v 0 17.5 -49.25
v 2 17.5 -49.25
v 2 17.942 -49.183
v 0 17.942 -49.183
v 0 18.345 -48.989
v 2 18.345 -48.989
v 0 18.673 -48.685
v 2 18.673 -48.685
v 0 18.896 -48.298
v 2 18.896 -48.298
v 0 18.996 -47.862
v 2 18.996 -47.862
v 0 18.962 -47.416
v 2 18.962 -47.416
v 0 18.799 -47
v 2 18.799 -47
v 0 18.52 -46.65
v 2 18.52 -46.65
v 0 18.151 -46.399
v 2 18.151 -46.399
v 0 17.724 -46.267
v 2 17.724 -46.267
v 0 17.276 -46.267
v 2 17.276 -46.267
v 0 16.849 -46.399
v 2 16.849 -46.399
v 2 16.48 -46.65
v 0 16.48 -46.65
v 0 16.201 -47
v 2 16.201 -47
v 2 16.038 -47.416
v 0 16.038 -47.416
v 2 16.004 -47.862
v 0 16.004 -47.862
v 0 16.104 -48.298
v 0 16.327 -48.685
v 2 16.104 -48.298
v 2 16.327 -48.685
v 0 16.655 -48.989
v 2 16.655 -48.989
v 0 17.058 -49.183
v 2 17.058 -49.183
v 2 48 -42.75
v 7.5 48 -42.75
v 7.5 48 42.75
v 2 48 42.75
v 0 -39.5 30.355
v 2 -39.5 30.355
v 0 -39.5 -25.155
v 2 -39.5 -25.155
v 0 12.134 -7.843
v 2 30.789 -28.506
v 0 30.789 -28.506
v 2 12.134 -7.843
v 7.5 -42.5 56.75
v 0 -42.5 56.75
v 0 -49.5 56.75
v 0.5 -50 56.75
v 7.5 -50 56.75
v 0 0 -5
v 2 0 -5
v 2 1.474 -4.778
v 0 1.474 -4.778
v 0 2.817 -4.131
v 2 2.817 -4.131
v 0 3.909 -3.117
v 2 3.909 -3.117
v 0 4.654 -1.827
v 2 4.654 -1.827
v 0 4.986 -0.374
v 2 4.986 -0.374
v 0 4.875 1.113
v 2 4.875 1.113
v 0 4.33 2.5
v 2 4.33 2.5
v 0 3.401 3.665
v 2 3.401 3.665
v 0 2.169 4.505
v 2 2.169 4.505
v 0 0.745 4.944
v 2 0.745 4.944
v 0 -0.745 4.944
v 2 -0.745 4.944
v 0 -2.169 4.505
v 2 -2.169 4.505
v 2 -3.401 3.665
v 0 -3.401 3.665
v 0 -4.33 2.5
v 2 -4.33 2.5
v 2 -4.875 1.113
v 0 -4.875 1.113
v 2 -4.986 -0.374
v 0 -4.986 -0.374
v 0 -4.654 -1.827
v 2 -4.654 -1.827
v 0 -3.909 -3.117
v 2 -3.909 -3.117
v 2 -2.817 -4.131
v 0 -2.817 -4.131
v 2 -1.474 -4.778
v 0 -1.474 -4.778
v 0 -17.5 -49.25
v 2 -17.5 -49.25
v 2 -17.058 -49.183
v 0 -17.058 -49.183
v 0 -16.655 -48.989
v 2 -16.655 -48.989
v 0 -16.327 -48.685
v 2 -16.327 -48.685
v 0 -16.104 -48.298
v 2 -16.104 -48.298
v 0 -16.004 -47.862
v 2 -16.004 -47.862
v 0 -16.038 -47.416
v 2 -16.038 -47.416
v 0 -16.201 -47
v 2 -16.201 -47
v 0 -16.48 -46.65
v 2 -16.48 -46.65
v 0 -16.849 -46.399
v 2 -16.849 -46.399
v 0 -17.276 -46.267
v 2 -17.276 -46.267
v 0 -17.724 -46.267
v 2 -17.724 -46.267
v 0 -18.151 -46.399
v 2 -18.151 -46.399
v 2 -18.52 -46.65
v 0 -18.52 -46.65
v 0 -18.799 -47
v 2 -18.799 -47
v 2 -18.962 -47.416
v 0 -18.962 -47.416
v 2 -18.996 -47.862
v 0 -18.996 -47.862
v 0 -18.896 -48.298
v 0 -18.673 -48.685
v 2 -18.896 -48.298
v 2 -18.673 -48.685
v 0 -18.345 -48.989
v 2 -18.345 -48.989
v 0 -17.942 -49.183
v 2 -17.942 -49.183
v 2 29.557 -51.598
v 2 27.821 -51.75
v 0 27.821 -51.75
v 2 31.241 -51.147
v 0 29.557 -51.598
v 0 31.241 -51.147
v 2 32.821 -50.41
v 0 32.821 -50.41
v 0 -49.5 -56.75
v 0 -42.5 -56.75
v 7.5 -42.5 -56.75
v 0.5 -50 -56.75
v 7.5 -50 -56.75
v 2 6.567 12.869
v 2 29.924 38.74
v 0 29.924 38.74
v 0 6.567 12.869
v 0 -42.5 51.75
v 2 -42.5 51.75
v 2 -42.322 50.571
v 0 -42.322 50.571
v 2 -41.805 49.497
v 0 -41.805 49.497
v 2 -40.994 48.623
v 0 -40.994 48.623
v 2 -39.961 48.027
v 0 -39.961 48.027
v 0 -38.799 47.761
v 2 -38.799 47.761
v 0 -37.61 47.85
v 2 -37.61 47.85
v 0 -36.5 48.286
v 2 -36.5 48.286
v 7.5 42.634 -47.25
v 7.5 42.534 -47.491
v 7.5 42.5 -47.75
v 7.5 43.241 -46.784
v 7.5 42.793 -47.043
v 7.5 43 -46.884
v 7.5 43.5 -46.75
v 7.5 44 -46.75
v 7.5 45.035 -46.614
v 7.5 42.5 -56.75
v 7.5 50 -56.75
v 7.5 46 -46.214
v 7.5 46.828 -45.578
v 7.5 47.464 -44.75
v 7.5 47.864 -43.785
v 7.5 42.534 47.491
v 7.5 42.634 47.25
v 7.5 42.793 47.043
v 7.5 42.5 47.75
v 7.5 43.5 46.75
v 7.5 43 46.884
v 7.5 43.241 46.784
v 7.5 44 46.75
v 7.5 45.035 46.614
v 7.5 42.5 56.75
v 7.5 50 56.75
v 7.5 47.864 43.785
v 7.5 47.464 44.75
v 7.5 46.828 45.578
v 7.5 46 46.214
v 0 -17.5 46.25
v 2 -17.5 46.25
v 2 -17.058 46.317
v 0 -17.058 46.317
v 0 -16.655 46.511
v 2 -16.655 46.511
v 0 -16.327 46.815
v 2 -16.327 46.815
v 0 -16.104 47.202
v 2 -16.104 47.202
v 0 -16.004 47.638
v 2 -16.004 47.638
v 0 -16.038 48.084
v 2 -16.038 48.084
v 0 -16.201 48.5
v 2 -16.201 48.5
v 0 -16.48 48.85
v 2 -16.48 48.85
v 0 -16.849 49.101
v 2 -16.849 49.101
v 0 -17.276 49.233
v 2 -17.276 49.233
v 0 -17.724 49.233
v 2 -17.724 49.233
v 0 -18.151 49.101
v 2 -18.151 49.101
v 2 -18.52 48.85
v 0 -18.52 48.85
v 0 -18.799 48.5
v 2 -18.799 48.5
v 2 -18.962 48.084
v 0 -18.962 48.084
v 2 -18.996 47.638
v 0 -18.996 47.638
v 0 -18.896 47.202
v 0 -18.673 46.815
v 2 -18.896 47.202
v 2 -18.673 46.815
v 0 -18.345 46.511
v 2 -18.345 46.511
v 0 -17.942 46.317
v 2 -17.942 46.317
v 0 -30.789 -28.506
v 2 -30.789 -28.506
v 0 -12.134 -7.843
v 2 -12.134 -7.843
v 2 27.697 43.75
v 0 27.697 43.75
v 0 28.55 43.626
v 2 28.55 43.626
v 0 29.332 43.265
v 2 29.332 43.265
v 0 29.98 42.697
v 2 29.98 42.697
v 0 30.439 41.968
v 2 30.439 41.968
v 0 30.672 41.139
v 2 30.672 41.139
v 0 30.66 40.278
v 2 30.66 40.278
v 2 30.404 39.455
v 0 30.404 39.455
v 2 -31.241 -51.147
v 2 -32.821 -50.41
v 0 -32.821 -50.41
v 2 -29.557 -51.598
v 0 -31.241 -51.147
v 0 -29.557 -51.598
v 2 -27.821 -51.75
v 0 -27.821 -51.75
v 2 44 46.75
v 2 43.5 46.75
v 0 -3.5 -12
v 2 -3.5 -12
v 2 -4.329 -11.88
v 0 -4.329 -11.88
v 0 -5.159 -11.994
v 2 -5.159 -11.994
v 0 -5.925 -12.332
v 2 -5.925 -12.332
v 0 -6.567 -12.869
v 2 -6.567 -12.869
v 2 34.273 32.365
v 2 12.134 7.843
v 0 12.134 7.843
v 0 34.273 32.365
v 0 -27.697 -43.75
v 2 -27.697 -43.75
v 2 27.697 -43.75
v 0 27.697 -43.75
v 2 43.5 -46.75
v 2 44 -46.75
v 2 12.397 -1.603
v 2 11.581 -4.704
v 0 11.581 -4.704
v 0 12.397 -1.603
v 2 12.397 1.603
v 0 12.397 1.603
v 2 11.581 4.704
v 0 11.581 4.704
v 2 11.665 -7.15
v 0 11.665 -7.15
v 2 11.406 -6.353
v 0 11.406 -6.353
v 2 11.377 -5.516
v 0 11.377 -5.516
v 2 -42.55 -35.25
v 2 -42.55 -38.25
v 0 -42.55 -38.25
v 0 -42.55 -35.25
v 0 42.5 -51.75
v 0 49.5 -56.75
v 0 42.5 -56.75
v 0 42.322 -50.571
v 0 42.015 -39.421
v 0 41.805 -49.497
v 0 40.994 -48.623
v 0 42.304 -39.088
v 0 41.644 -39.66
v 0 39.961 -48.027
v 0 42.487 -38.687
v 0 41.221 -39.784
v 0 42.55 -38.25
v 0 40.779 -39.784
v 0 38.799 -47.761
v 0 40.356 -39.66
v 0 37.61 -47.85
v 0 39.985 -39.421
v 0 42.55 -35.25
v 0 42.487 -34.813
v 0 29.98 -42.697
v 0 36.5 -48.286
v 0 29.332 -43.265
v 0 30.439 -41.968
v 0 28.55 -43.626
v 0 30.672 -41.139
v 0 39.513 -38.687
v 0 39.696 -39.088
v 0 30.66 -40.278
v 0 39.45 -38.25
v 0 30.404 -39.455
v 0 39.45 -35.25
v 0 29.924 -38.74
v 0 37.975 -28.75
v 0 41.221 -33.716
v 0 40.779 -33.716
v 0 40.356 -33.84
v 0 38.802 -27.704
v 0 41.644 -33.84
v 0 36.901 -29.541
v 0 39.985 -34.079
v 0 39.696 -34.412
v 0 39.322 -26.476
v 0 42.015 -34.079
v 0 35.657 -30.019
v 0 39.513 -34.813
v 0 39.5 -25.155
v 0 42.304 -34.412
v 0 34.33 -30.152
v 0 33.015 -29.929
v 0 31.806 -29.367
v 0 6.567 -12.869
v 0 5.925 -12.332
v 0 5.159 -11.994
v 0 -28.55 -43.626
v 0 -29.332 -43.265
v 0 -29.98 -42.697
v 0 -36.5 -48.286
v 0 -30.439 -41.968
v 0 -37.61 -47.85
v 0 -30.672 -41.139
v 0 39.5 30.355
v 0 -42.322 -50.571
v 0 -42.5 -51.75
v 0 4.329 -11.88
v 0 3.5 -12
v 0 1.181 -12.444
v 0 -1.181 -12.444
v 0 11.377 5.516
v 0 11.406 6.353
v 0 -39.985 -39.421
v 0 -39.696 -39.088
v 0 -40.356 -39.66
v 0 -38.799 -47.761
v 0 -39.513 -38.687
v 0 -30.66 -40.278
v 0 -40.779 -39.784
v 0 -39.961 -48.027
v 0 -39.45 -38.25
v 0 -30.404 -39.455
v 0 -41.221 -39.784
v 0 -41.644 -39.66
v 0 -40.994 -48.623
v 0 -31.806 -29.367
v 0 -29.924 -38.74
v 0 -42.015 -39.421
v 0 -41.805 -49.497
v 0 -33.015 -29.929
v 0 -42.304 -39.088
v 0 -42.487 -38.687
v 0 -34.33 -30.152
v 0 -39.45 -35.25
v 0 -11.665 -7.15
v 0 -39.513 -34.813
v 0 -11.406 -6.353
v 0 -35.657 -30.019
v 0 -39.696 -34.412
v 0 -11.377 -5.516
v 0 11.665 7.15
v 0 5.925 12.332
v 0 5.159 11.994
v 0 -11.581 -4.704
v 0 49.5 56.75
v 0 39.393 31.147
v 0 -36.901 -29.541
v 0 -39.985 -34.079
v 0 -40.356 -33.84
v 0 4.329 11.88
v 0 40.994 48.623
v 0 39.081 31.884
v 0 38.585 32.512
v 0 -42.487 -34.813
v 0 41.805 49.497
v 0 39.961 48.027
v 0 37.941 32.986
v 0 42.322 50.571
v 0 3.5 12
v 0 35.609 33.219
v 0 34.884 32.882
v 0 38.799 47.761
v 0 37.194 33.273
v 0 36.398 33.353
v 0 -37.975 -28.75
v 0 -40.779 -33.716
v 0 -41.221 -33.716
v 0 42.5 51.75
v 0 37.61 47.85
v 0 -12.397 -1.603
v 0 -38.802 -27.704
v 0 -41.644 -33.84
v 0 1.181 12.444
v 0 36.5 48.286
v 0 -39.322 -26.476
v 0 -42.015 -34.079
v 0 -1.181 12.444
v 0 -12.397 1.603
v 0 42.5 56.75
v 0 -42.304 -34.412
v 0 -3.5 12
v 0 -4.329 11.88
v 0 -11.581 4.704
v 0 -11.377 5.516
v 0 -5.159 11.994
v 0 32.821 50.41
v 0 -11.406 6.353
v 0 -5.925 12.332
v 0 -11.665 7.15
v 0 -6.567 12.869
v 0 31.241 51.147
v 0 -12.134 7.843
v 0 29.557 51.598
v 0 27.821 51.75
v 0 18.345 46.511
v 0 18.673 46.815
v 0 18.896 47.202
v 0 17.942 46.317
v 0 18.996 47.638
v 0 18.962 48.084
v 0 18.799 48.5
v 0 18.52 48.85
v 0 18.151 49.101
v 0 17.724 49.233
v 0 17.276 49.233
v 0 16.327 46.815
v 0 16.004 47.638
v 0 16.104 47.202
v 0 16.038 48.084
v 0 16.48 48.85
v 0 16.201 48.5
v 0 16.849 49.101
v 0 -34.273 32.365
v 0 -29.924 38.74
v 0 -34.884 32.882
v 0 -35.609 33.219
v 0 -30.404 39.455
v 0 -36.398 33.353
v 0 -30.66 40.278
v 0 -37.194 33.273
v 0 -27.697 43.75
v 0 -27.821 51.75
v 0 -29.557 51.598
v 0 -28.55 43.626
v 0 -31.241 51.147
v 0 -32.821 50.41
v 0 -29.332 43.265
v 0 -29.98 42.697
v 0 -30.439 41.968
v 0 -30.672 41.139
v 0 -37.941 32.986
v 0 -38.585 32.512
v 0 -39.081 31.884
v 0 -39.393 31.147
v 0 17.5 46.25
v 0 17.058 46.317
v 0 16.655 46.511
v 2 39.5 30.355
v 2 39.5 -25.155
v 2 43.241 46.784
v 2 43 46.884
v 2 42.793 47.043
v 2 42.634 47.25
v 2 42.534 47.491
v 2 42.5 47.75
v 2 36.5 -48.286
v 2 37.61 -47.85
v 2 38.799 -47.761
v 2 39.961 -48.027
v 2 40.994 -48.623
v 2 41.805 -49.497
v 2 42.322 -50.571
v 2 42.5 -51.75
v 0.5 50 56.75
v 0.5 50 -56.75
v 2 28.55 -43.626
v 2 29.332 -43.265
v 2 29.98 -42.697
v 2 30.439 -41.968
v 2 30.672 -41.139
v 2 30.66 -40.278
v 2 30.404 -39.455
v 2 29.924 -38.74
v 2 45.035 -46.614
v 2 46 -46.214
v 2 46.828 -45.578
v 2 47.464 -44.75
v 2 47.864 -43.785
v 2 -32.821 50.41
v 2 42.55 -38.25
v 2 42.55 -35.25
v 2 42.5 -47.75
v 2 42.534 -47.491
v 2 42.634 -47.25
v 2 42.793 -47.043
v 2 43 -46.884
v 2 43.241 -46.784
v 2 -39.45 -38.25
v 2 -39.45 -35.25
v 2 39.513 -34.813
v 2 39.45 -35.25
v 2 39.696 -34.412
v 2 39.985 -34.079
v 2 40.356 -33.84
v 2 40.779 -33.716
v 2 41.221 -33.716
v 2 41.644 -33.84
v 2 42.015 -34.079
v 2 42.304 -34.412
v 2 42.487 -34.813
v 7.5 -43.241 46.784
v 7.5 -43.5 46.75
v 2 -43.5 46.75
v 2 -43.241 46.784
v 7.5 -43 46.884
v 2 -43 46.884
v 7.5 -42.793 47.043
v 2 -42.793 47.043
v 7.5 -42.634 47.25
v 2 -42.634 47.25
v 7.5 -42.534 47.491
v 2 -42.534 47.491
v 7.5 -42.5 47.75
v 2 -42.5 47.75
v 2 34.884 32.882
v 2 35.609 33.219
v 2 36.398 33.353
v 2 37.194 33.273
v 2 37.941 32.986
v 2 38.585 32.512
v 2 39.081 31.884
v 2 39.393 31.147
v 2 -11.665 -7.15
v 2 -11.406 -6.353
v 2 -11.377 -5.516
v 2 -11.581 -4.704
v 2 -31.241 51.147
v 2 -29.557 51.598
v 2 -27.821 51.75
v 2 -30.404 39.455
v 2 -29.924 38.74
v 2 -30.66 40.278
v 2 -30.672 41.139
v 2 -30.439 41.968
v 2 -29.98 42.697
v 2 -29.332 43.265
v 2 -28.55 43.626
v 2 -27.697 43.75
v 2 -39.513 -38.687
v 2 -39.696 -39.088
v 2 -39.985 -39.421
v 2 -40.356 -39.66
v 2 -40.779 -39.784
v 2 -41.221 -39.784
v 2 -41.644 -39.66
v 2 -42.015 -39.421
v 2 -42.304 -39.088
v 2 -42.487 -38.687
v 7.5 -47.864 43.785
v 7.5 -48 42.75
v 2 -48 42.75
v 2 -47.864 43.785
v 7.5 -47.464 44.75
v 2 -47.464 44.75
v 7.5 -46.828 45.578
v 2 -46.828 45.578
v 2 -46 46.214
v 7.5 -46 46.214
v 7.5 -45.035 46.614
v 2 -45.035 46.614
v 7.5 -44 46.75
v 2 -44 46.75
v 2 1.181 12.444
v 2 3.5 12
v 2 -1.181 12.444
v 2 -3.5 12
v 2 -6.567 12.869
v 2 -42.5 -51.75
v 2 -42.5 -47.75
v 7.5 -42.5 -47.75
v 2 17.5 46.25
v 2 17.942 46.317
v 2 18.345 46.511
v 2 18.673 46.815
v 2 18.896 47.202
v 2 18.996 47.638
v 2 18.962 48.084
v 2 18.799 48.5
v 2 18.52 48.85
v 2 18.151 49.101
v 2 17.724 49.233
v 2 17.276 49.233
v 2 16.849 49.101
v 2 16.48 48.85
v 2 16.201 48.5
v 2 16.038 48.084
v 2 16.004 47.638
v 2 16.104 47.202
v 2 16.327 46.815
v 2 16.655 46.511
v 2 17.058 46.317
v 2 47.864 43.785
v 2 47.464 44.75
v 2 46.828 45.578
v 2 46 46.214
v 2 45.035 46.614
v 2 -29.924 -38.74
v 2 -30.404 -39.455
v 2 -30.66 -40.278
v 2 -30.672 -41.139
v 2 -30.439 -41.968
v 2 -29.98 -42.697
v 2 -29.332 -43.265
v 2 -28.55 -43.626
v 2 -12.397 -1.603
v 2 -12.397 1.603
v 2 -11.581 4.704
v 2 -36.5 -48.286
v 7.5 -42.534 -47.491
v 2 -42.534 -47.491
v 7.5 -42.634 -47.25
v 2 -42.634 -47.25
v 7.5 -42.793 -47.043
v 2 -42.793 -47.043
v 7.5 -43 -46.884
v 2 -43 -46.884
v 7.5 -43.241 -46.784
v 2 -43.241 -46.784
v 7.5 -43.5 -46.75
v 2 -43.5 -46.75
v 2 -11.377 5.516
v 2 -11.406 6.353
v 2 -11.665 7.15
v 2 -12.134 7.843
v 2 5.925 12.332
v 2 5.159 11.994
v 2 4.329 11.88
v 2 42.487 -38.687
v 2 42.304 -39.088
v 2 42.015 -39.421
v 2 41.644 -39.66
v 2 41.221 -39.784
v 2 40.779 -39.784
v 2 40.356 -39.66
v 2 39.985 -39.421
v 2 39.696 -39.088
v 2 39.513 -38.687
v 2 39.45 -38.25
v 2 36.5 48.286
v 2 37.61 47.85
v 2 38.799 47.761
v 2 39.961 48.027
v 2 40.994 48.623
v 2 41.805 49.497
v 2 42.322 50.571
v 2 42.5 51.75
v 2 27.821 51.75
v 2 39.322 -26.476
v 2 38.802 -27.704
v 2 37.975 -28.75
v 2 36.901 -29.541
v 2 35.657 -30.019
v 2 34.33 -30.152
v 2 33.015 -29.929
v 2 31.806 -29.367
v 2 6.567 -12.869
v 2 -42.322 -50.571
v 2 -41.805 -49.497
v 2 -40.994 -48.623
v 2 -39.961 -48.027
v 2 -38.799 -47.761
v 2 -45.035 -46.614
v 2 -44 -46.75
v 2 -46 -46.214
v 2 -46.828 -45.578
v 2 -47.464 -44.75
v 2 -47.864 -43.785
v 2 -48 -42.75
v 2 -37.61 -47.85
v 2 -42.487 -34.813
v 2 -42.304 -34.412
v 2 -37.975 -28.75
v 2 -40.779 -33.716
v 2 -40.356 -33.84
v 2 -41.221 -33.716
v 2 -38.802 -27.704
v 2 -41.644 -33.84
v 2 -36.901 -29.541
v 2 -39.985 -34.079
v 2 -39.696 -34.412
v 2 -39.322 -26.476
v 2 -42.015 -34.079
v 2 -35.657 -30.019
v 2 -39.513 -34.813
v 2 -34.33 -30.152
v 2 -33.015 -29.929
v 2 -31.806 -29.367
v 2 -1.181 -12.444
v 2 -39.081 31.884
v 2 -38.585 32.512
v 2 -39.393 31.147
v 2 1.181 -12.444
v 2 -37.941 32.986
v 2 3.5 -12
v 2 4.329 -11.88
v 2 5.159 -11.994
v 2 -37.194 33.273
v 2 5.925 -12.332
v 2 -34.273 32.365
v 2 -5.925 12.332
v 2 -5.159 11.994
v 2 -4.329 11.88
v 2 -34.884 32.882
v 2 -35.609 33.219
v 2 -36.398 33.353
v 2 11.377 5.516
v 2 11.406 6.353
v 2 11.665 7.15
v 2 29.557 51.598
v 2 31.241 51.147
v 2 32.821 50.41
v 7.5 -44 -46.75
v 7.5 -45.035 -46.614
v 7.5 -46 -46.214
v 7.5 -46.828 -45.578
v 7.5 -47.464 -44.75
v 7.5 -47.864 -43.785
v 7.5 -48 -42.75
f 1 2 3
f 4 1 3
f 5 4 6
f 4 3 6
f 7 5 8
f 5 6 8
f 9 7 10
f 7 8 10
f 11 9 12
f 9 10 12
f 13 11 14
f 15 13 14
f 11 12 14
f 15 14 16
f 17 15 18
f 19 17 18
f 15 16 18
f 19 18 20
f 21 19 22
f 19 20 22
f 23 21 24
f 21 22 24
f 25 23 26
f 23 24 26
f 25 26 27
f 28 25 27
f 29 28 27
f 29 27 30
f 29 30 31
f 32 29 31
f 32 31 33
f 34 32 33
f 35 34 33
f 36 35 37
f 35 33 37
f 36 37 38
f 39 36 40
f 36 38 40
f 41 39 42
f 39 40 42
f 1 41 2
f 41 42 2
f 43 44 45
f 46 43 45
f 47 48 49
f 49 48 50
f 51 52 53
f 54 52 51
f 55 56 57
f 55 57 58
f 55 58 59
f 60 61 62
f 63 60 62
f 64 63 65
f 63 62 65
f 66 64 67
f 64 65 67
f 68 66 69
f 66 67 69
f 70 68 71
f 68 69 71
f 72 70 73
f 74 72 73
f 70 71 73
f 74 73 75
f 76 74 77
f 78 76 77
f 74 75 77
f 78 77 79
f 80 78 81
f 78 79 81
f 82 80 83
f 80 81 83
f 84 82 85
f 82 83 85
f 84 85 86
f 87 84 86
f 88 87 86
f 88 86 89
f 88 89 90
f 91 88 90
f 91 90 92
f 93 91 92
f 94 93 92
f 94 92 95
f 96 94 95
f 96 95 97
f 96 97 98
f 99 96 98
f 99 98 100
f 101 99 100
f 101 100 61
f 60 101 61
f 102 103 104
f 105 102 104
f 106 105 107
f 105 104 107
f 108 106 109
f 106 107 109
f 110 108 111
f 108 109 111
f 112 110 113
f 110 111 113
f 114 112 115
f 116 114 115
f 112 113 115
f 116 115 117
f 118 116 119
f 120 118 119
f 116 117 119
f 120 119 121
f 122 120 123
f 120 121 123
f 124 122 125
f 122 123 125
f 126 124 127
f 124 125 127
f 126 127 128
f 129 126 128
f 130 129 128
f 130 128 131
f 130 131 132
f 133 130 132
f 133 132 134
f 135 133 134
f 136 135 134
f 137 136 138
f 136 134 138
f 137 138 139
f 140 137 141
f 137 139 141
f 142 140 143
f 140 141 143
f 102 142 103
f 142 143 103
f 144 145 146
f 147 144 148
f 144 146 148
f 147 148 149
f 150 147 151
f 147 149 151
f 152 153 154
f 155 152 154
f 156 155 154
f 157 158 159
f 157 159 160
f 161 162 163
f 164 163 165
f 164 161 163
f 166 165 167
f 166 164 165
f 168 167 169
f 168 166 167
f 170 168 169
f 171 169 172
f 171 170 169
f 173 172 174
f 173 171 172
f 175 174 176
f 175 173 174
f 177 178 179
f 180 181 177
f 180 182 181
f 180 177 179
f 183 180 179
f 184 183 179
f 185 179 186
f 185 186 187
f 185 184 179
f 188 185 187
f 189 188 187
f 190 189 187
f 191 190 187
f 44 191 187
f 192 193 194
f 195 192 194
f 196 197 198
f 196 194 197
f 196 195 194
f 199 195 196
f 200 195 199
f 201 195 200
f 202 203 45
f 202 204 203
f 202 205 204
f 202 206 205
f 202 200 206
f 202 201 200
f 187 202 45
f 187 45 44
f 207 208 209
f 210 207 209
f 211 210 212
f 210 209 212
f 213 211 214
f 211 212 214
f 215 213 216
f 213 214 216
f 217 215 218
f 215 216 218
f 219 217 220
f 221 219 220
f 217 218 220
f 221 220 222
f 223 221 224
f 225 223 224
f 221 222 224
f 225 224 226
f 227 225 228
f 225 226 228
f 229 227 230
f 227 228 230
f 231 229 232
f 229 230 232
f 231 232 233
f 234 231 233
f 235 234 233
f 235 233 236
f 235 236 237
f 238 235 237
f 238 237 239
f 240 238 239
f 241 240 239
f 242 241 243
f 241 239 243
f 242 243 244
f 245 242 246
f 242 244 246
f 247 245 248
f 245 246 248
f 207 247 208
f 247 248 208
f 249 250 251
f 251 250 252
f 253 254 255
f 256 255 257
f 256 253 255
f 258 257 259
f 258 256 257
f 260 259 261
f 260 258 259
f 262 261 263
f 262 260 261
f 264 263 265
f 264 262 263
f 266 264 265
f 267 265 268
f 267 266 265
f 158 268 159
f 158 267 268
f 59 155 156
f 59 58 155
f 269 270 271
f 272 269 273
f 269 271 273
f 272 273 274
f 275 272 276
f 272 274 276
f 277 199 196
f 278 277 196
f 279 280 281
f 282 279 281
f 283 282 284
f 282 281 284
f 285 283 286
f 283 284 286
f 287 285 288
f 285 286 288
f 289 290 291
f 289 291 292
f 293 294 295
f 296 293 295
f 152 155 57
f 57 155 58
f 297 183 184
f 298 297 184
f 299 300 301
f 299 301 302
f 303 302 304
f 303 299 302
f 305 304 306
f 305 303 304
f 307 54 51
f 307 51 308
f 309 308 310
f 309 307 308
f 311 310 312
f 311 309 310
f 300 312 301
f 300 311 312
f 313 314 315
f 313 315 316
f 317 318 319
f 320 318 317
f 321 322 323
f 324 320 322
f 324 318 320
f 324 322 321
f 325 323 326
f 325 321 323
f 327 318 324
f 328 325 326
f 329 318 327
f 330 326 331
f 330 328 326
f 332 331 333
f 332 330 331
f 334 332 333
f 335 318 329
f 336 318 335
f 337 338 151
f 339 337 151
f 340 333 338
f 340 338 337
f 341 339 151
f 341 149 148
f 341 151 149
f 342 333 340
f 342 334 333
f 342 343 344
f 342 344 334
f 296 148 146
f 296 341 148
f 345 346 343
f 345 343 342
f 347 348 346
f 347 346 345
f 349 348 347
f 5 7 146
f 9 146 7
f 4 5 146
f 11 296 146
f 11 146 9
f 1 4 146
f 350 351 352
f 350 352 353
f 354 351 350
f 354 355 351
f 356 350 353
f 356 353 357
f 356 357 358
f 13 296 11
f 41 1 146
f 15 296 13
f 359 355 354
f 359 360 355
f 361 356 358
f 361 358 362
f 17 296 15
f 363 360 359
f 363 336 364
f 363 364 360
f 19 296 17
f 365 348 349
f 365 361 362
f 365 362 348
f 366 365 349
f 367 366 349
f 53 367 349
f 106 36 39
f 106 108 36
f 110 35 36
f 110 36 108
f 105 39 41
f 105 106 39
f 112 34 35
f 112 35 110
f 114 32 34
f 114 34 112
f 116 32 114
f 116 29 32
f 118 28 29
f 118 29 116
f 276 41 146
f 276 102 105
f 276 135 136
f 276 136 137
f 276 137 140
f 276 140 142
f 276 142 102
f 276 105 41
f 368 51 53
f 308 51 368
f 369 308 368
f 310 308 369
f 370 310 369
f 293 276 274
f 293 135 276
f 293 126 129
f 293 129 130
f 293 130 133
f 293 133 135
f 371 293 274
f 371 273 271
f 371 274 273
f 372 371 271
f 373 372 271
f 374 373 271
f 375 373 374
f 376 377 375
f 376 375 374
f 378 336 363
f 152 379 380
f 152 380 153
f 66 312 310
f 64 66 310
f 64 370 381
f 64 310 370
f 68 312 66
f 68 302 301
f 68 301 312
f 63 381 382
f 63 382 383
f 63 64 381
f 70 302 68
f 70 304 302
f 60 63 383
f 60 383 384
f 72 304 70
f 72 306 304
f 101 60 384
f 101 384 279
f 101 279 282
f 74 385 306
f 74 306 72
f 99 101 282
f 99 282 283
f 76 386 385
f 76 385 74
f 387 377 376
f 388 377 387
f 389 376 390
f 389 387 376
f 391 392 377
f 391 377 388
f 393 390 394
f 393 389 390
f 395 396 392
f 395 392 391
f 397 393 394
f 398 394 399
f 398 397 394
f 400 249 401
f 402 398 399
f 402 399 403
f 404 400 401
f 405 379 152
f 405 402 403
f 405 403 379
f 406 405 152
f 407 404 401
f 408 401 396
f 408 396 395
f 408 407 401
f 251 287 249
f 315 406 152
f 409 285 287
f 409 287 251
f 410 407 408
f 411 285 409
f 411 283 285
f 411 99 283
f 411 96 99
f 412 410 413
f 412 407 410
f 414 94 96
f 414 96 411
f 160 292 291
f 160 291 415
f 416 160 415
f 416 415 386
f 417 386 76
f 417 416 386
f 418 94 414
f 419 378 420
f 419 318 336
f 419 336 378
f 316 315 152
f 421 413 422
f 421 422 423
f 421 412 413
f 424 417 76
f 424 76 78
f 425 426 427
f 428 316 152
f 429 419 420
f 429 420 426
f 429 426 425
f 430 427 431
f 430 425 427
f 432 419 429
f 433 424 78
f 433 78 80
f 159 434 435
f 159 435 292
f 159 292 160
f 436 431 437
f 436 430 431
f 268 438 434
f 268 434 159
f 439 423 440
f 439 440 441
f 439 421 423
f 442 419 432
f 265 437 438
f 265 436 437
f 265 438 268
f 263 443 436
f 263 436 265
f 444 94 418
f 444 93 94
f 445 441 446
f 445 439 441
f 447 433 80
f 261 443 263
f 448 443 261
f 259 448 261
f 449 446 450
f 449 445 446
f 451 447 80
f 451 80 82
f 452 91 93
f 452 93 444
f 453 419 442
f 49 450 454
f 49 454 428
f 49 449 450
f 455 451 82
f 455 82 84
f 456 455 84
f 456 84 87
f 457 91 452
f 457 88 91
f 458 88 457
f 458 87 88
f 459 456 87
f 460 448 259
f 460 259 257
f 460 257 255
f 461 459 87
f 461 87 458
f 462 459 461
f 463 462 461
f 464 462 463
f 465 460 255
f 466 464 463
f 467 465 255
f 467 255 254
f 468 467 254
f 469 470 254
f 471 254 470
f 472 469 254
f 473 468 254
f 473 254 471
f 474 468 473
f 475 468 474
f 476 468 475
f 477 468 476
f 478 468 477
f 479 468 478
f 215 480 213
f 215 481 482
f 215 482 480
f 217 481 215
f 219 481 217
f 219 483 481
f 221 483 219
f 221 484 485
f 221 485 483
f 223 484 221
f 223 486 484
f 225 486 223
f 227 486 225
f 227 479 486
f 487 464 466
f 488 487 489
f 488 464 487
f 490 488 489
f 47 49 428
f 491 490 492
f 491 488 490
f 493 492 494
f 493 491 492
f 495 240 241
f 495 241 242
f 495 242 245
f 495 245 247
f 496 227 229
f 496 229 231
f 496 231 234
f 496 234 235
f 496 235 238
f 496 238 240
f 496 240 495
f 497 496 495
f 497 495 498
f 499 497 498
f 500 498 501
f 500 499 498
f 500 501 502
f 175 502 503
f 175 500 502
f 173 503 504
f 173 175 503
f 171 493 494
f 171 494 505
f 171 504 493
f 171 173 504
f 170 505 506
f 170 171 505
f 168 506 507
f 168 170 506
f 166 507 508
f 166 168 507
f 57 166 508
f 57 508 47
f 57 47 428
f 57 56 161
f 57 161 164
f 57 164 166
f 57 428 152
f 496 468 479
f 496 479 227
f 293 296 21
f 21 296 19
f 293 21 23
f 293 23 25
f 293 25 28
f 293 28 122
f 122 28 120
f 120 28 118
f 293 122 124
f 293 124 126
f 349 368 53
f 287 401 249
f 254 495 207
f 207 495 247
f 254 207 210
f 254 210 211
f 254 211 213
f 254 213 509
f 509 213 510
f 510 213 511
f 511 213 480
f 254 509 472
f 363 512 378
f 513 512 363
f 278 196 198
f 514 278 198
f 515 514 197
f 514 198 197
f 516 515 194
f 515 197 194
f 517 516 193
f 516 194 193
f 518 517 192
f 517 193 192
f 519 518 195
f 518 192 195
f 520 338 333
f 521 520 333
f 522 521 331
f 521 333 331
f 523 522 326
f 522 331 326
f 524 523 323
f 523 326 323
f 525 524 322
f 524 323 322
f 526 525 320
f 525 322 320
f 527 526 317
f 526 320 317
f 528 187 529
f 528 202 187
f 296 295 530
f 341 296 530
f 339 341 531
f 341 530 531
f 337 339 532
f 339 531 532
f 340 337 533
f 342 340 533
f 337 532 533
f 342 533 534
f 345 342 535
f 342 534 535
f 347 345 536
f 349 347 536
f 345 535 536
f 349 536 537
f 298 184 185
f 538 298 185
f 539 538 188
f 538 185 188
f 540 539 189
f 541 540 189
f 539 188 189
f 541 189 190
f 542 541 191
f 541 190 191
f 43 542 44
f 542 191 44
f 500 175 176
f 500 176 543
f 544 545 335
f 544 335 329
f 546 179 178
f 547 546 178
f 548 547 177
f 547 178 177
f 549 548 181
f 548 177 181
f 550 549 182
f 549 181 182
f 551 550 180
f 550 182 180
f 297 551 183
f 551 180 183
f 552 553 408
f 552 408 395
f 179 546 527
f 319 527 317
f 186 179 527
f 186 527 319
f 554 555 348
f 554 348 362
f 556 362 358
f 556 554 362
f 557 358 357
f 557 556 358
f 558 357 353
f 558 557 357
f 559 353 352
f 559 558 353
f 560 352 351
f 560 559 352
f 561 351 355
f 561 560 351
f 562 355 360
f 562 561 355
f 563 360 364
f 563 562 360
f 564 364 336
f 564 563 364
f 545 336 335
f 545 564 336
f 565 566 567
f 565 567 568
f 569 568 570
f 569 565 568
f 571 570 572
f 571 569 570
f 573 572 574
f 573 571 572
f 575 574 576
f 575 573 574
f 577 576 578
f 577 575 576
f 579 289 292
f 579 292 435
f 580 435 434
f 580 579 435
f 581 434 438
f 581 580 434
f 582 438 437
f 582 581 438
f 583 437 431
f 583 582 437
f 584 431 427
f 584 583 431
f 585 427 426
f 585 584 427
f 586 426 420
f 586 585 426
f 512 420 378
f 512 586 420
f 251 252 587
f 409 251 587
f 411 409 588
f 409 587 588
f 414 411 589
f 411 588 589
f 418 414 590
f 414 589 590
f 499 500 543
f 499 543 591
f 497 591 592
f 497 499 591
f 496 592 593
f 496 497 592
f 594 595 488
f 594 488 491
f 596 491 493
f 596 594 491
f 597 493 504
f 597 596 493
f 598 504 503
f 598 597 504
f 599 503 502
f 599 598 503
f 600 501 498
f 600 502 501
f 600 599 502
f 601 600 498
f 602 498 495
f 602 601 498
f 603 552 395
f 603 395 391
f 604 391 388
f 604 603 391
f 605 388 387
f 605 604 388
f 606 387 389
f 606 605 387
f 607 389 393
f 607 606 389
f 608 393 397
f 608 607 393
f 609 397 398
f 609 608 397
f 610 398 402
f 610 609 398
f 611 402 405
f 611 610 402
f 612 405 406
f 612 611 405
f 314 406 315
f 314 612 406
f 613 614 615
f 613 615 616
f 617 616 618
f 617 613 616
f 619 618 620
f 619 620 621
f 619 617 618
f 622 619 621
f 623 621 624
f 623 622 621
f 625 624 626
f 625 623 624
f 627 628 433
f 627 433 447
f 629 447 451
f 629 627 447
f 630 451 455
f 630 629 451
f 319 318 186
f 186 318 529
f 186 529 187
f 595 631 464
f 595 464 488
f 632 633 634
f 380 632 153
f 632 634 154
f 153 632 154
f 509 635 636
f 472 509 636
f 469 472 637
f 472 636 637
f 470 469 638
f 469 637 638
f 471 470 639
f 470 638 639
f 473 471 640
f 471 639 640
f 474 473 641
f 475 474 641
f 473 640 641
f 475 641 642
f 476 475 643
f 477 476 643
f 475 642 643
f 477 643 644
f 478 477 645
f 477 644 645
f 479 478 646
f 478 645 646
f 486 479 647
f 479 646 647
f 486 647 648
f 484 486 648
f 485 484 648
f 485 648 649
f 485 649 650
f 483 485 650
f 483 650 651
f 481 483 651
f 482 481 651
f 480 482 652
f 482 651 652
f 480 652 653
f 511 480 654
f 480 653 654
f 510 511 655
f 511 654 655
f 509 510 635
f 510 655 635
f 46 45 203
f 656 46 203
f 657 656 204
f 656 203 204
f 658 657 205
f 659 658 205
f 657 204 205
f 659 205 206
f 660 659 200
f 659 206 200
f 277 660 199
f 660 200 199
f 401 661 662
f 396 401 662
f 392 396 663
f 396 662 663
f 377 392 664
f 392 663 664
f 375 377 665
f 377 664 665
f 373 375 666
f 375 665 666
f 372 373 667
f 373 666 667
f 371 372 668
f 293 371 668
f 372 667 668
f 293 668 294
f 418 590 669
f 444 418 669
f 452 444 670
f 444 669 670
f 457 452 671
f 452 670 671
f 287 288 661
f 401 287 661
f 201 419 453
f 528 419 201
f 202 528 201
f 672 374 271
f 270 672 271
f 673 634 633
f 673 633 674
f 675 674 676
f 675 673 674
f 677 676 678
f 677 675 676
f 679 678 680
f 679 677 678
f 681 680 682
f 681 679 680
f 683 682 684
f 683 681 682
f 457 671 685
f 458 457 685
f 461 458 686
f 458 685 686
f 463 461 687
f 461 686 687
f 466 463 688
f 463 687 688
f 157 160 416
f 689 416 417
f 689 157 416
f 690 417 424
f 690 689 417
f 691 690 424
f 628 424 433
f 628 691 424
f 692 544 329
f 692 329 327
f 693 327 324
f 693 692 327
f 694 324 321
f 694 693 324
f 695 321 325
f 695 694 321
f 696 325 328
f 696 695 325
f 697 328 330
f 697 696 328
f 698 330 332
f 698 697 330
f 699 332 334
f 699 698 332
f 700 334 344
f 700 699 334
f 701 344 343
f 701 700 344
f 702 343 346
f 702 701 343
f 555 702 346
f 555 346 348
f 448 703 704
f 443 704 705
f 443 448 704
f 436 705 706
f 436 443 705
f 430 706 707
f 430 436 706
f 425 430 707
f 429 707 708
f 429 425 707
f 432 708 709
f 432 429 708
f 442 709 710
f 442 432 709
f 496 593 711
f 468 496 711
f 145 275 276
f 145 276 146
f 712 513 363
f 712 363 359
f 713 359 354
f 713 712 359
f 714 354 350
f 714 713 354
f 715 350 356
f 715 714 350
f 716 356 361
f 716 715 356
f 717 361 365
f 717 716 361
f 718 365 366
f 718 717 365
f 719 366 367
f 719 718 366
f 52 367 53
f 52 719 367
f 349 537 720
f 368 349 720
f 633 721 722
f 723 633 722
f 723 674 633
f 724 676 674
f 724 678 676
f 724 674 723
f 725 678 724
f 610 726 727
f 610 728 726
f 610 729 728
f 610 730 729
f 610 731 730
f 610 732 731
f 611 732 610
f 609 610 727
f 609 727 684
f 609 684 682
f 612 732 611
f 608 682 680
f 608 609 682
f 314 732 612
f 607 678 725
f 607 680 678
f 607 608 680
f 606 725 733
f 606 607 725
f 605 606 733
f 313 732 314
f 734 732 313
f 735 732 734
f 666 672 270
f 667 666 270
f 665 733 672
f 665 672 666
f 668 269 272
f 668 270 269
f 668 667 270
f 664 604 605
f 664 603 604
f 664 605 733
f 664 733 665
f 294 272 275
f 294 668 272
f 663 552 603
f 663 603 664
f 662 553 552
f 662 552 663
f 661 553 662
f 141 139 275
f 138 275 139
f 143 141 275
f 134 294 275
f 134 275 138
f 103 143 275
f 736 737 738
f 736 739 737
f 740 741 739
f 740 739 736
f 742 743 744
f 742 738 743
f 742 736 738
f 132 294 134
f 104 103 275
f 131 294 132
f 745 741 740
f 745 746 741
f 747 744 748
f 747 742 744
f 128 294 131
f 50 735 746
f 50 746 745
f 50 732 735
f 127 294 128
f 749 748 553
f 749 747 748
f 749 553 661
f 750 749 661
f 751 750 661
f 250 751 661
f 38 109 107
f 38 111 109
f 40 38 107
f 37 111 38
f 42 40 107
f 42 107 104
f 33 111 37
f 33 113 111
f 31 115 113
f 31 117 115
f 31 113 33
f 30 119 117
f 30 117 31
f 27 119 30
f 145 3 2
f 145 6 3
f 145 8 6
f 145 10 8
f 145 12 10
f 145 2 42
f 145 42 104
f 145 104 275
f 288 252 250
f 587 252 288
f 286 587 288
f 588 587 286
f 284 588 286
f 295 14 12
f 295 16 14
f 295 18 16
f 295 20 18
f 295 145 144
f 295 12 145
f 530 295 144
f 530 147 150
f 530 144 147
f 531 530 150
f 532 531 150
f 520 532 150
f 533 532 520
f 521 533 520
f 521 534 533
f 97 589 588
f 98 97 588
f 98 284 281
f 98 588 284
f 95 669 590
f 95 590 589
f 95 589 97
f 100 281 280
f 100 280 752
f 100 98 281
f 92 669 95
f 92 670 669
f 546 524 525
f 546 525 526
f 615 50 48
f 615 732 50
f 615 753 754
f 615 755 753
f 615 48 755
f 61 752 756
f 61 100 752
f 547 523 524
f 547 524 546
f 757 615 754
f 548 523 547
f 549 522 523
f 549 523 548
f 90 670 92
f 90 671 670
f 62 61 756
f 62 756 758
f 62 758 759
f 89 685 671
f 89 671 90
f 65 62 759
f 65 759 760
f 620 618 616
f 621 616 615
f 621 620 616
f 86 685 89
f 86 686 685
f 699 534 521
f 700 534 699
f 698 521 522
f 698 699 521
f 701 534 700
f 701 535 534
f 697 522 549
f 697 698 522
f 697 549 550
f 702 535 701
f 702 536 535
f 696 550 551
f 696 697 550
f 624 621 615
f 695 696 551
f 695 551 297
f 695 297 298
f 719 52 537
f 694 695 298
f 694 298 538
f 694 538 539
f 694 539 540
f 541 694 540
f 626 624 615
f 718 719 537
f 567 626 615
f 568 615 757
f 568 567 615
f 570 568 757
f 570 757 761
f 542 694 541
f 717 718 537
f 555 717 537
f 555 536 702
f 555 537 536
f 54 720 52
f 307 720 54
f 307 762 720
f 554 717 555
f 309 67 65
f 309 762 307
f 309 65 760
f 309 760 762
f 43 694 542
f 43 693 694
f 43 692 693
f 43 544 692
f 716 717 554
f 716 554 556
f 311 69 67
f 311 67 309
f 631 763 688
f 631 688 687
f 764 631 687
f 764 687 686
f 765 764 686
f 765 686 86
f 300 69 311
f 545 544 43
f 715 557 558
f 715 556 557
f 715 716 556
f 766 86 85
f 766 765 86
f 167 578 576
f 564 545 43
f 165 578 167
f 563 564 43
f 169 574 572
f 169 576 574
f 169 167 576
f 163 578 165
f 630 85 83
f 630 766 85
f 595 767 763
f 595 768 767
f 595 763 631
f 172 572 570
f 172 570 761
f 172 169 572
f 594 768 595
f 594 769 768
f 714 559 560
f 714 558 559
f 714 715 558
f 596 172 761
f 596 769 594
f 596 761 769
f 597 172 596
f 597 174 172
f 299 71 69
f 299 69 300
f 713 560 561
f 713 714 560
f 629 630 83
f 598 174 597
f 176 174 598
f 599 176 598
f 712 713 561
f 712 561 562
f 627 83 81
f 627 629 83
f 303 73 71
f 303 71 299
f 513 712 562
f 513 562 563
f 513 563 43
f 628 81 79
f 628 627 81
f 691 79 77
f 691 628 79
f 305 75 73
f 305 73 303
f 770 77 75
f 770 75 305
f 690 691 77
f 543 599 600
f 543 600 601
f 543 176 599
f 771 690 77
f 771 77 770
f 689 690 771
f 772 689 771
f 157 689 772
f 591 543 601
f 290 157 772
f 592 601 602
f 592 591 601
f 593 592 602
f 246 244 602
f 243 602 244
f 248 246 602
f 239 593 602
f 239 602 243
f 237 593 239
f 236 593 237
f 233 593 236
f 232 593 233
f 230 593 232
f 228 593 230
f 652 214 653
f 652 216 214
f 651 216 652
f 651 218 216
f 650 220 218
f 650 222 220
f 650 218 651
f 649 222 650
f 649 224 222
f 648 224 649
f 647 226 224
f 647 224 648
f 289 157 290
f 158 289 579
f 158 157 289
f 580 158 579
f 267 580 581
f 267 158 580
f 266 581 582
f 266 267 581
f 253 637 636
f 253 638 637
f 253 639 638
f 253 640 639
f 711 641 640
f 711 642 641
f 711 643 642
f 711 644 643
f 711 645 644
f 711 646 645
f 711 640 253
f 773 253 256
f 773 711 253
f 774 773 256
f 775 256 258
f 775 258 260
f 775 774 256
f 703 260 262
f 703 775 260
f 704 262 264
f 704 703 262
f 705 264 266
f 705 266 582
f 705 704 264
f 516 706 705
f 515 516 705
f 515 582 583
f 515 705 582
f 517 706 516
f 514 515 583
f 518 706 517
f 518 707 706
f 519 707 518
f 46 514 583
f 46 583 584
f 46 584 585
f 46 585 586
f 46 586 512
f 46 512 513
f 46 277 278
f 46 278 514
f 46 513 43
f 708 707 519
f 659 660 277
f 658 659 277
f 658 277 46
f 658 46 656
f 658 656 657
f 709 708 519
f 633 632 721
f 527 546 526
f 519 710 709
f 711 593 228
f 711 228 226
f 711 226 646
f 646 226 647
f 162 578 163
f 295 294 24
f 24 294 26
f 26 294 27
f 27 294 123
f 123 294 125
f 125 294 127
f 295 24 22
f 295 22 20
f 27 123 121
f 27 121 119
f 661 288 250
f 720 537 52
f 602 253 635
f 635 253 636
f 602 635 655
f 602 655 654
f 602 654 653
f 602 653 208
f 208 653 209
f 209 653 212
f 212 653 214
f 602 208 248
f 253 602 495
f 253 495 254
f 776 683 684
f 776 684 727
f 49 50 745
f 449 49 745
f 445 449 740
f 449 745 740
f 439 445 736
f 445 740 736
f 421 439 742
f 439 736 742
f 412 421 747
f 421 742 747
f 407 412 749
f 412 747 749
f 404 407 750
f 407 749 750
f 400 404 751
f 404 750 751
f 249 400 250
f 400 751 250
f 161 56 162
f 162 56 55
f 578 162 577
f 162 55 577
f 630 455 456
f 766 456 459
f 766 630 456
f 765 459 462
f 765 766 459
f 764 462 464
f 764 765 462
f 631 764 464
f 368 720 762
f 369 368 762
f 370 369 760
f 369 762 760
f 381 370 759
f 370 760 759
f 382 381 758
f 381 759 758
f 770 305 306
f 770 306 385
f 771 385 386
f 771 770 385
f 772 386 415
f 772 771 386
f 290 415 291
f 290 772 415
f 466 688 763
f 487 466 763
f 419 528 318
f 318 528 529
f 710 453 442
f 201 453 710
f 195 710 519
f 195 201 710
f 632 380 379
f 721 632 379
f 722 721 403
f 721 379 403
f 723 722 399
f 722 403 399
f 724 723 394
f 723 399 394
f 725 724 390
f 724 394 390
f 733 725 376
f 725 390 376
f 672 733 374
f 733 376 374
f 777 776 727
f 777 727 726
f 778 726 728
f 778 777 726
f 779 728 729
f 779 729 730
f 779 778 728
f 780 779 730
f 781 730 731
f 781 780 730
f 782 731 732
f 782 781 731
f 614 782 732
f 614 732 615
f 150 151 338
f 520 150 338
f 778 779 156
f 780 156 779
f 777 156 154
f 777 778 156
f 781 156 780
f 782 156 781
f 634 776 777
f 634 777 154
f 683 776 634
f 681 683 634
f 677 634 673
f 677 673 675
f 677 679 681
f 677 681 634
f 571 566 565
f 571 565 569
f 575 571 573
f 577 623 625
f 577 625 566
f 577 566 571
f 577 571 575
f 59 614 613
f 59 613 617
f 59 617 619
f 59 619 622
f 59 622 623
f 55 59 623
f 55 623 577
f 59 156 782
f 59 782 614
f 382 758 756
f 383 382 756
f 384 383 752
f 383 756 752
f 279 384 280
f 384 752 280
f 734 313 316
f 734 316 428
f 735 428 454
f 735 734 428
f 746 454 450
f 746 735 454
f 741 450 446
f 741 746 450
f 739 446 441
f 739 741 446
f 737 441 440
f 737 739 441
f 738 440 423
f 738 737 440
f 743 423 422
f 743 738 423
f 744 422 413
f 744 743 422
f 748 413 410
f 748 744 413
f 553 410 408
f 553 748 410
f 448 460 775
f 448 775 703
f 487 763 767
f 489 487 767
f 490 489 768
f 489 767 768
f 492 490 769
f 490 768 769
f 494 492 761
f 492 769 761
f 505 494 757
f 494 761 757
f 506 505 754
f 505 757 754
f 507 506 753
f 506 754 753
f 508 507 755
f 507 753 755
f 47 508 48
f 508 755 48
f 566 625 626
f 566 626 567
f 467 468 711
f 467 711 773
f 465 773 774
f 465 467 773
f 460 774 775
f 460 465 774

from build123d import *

# Parameters (mm, degrees)
BOSS_EXTRUDE1_DEPTH = 56.75
SKETCH2_W           = 5
SKETCH2_H           = 85
SKETCH2_R           = 1.5
CUT_EXTRUDE1_DEPTH  = 2
SKETCH3_R           = 5
CUT_EXTRUDE2_DEPTH  = 3
CHAMFER1_SIZE       = 0.5
CUT_EXTRUDE3_DEPTH  = 5.5
CUT_EXTRUDE4_DEPTH  = 10


with BuildPart() as part:
    # Sketch1 → Boss-Extrude1 (new body, symmetric)
    with BuildSketch(Plane.XY):
        Polygon((0, 50), (0, -50), (7.5, -50), (7.5, -42.5), (2, -42.5), (2, 42.5), (7.5, 42.5), (7.5, 50), align=None)
    extrude(amount=BOSS_EXTRUDE1_DEPTH, both=True)

    # Sketch2 → Cut-Extrude1 (cut)
    with BuildSketch(Plane(origin=(2, 0, 0), x_dir=(0, 0, -1), z_dir=(1, 0, 0))):
        with Locations((-54.25, 0)):
            Rectangle(SKETCH2_W, SKETCH2_H)
        with Locations((54.25, 0)):
            Rectangle(SKETCH2_W, SKETCH2_H)
        with Locations((-47.75, 17.5)):
            Circle(SKETCH2_R)
        with Locations((-47.75, -17.5)):
            Circle(SKETCH2_R)
        with Locations((47.75, 17.5)):
            Circle(SKETCH2_R)
        with Locations((47.75, -17.5)):
            Circle(SKETCH2_R)
    extrude(amount=-CUT_EXTRUDE1_DEPTH, mode=Mode.SUBTRACT)

    # Sketch3 → Cut-Extrude2 (cut, through all)
    with BuildSketch(Plane(origin=(2, 0, 0), x_dir=(0, 0, -1), z_dir=(1, 0, 0))):
        Circle(SKETCH3_R)
        with BuildLine():
            Line((-30.354626116, -39.5), (25.154965406, -39.5))
            ThreePointArc((25.154965406, -39.5), (29.821654194, -36.294997423), (28.505643146, -30.7888063))
            Line((28.505643146, -30.7888063), (7.843483172, -12.13382758))
            ThreePointArc((7.843483172, -12.13382758), (6.353277021, -11.405989443), (4.704093974, -11.58108371))
            ThreePointArc((4.704093974, -11.58108371), (0, -12.5), (-4.704093974, -11.58108371))
            ThreePointArc((-4.704093974, -11.58108371), (-6.353277021, -11.405989443), (-7.843483172, -12.13382758))
            Line((-7.843483172, -12.13382758), (-32.36503276, -34.27328378))
            ThreePointArc((-32.36503276, -34.27328378), (-33.154639389, -37.576998454), (-30.354626116, -39.5))
        make_face()
        with BuildLine():
            Line((-43.75, -27.697319579), (-43.75, 27.697319579))
            ThreePointArc((-43.75, 27.697319579), (-41.968355463, 30.438780862), (-38.739593356, 29.924035799))
            Line((-38.739593356, 29.924035799), (-12.869499782, 6.56703703))
            ThreePointArc((-12.869499782, 6.56703703), (-11.993687913, 5.158698897), (-11.999924538, 3.500258718))
            ThreePointArc((-11.999924538, 3.500258718), (-12.5, 0), (-11.999924538, -3.500258718))
            ThreePointArc((-11.999924538, -3.500258718), (-11.993687913, -5.158698897), (-12.869499782, -6.56703703))
            Line((-12.869499782, -6.56703703), (-38.739593356, -29.924035799))
            ThreePointArc((-38.739593356, -29.924035799), (-41.968355463, -30.438780862), (-43.75, -27.697319579))
        make_face()
        with BuildLine():
            Line((-30.354626116, 39.5), (25.154965406, 39.5))
            ThreePointArc((25.154965406, 39.5), (29.821654194, 36.294997423), (28.505643146, 30.7888063))
            Line((28.505643146, 30.7888063), (7.843483172, 12.13382758))
            ThreePointArc((7.843483172, 12.13382758), (6.353277021, 11.405989443), (4.704093974, 11.58108371))
            ThreePointArc((4.704093974, 11.58108371), (0, 12.5), (-4.704093974, 11.58108371))
            ThreePointArc((-4.704093974, 11.58108371), (-6.353277021, 11.405989443), (-7.843483172, 12.13382758))
            Line((-7.843483172, 12.13382758), (-32.36503276, 34.27328378))
            ThreePointArc((-32.36503276, 34.27328378), (-33.154639389, 37.576998454), (-30.354626116, 39.5))
        make_face()
        with BuildLine():
            Line((43.75, -27.697319579), (43.75, 27.697319579))
            ThreePointArc((43.75, 27.697319579), (41.968355463, 30.438780862), (38.739593356, 29.924035799))
            Line((38.739593356, 29.924035799), (12.869499782, 6.56703703))
            ThreePointArc((12.869499782, 6.56703703), (11.993687913, 5.158698897), (11.999924538, 3.500258718))
            ThreePointArc((11.999924538, 3.500258718), (12.5, 0), (11.999924538, -3.500258718))
            ThreePointArc((11.999924538, -3.500258718), (11.993687913, -5.158698897), (12.869499782, -6.56703703))
            Line((12.869499782, -6.56703703), (38.739593356, -29.924035799))
            ThreePointArc((38.739593356, -29.924035799), (41.968355463, -30.438780862), (43.75, -27.697319579))
        make_face()
        with BuildLine():
            Line((35.25, -39.45), (38.25, -39.45))
            ThreePointArc((38.25, -39.45), (39.8, -41), (38.25, -42.55))
            Line((38.25, -42.55), (35.25, -42.55))
            ThreePointArc((35.25, -42.55), (33.7, -41), (35.25, -39.45))
        make_face()
        with BuildLine():
            Line((35.25, 42.55), (38.25, 42.55))
            ThreePointArc((38.25, 42.55), (39.8, 41), (38.25, 39.45))
            Line((38.25, 39.45), (35.25, 39.45))
            ThreePointArc((35.25, 39.45), (33.7, 41), (35.25, 42.55))
        make_face()
    extrude(amount=-CUT_EXTRUDE2_DEPTH, mode=Mode.SUBTRACT)

    # Chamfer1
    chamfer1_edges = [part.edges().sort_by_distance(p)[0] for p in [
        (0, -50, 0),
        (0, 50, 0),
    ]]
    chamfer(chamfer1_edges, length=CHAMFER1_SIZE)

    # Sketch4 → Cut-Extrude3 (cut)
    with BuildSketch(Plane(origin=(7.5, 0, 0), x_dir=(0, 0, -1), z_dir=(1, 0, 0))):
        with BuildLine():
            Line((42.75, -48), (-42.75, -48))
            ThreePointArc((-42.75, -48), (-45.578427125, -46.828427125), (-46.75, -44))
            Line((-46.75, -44), (-46.75, -43.5))
            ThreePointArc((-46.75, -43.5), (-47.042893219, -42.792893219), (-47.75, -42.5))
            Line((-47.75, -42.5), (47.75, -42.5))
            ThreePointArc((47.75, -42.5), (47.042893219, -42.792893219), (46.75, -43.5))
            Line((46.75, -43.5), (46.75, -44))
            ThreePointArc((46.75, -44), (45.578427125, -46.828427125), (42.75, -48))
        make_face()
        with BuildLine():
            Line((-46.75, 44), (-46.75, 43.5))
            ThreePointArc((-46.75, 43.5), (-47.042893219, 42.792893219), (-47.75, 42.5))
            Line((-47.75, 42.5), (47.75, 42.5))
            ThreePointArc((47.75, 42.5), (47.042893219, 42.792893219), (46.75, 43.5))
            Line((46.75, 43.5), (46.75, 44))
            ThreePointArc((46.75, 44), (45.578427125, 46.828427125), (42.75, 48))
            Line((42.75, 48), (-42.75, 48))
            ThreePointArc((-42.75, 48), (-45.578427125, 46.828427125), (-46.75, 44))
        make_face()
    extrude(amount=-CUT_EXTRUDE3_DEPTH, mode=Mode.SUBTRACT)

    # Sketch5 → Cut-Extrude4 (cut)
    with BuildSketch(Plane.ZY):
        with BuildLine():
            ThreePointArc((-51.75, 27.820508076), (-51.409258263, 30.408698527), (-50.410254038, 32.820508076))
            Line((-50.410254038, 32.820508076), (-48.285898385, 36.5))
            ThreePointArc((-48.285898385, 36.5), (-48.285898385, 40.5), (-51.75, 42.5))
            Line((-51.75, 42.5), (-51.75, 27.820508076))
        make_face()
        with BuildLine():
            ThreePointArc((-50.410254038, -32.820508076), (-51.409258263, -30.408698527), (-51.75, -27.820508076))
            Line((-51.75, -27.820508076), (-51.75, -42.5))
            ThreePointArc((-51.75, -42.5), (-48.285898385, -40.5), (-48.285898385, -36.5))
            Line((-48.285898385, -36.5), (-50.410254038, -32.820508076))
        make_face()
    cut_extrude4 = extrude(amount=-CUT_EXTRUDE4_DEPTH, mode=Mode.SUBTRACT)

    # Mirror1: Cut-Extrude4 across plane
    add(cut_extrude4.mirror(Plane.XY), mode=Mode.SUBTRACT)


solid = part.part
